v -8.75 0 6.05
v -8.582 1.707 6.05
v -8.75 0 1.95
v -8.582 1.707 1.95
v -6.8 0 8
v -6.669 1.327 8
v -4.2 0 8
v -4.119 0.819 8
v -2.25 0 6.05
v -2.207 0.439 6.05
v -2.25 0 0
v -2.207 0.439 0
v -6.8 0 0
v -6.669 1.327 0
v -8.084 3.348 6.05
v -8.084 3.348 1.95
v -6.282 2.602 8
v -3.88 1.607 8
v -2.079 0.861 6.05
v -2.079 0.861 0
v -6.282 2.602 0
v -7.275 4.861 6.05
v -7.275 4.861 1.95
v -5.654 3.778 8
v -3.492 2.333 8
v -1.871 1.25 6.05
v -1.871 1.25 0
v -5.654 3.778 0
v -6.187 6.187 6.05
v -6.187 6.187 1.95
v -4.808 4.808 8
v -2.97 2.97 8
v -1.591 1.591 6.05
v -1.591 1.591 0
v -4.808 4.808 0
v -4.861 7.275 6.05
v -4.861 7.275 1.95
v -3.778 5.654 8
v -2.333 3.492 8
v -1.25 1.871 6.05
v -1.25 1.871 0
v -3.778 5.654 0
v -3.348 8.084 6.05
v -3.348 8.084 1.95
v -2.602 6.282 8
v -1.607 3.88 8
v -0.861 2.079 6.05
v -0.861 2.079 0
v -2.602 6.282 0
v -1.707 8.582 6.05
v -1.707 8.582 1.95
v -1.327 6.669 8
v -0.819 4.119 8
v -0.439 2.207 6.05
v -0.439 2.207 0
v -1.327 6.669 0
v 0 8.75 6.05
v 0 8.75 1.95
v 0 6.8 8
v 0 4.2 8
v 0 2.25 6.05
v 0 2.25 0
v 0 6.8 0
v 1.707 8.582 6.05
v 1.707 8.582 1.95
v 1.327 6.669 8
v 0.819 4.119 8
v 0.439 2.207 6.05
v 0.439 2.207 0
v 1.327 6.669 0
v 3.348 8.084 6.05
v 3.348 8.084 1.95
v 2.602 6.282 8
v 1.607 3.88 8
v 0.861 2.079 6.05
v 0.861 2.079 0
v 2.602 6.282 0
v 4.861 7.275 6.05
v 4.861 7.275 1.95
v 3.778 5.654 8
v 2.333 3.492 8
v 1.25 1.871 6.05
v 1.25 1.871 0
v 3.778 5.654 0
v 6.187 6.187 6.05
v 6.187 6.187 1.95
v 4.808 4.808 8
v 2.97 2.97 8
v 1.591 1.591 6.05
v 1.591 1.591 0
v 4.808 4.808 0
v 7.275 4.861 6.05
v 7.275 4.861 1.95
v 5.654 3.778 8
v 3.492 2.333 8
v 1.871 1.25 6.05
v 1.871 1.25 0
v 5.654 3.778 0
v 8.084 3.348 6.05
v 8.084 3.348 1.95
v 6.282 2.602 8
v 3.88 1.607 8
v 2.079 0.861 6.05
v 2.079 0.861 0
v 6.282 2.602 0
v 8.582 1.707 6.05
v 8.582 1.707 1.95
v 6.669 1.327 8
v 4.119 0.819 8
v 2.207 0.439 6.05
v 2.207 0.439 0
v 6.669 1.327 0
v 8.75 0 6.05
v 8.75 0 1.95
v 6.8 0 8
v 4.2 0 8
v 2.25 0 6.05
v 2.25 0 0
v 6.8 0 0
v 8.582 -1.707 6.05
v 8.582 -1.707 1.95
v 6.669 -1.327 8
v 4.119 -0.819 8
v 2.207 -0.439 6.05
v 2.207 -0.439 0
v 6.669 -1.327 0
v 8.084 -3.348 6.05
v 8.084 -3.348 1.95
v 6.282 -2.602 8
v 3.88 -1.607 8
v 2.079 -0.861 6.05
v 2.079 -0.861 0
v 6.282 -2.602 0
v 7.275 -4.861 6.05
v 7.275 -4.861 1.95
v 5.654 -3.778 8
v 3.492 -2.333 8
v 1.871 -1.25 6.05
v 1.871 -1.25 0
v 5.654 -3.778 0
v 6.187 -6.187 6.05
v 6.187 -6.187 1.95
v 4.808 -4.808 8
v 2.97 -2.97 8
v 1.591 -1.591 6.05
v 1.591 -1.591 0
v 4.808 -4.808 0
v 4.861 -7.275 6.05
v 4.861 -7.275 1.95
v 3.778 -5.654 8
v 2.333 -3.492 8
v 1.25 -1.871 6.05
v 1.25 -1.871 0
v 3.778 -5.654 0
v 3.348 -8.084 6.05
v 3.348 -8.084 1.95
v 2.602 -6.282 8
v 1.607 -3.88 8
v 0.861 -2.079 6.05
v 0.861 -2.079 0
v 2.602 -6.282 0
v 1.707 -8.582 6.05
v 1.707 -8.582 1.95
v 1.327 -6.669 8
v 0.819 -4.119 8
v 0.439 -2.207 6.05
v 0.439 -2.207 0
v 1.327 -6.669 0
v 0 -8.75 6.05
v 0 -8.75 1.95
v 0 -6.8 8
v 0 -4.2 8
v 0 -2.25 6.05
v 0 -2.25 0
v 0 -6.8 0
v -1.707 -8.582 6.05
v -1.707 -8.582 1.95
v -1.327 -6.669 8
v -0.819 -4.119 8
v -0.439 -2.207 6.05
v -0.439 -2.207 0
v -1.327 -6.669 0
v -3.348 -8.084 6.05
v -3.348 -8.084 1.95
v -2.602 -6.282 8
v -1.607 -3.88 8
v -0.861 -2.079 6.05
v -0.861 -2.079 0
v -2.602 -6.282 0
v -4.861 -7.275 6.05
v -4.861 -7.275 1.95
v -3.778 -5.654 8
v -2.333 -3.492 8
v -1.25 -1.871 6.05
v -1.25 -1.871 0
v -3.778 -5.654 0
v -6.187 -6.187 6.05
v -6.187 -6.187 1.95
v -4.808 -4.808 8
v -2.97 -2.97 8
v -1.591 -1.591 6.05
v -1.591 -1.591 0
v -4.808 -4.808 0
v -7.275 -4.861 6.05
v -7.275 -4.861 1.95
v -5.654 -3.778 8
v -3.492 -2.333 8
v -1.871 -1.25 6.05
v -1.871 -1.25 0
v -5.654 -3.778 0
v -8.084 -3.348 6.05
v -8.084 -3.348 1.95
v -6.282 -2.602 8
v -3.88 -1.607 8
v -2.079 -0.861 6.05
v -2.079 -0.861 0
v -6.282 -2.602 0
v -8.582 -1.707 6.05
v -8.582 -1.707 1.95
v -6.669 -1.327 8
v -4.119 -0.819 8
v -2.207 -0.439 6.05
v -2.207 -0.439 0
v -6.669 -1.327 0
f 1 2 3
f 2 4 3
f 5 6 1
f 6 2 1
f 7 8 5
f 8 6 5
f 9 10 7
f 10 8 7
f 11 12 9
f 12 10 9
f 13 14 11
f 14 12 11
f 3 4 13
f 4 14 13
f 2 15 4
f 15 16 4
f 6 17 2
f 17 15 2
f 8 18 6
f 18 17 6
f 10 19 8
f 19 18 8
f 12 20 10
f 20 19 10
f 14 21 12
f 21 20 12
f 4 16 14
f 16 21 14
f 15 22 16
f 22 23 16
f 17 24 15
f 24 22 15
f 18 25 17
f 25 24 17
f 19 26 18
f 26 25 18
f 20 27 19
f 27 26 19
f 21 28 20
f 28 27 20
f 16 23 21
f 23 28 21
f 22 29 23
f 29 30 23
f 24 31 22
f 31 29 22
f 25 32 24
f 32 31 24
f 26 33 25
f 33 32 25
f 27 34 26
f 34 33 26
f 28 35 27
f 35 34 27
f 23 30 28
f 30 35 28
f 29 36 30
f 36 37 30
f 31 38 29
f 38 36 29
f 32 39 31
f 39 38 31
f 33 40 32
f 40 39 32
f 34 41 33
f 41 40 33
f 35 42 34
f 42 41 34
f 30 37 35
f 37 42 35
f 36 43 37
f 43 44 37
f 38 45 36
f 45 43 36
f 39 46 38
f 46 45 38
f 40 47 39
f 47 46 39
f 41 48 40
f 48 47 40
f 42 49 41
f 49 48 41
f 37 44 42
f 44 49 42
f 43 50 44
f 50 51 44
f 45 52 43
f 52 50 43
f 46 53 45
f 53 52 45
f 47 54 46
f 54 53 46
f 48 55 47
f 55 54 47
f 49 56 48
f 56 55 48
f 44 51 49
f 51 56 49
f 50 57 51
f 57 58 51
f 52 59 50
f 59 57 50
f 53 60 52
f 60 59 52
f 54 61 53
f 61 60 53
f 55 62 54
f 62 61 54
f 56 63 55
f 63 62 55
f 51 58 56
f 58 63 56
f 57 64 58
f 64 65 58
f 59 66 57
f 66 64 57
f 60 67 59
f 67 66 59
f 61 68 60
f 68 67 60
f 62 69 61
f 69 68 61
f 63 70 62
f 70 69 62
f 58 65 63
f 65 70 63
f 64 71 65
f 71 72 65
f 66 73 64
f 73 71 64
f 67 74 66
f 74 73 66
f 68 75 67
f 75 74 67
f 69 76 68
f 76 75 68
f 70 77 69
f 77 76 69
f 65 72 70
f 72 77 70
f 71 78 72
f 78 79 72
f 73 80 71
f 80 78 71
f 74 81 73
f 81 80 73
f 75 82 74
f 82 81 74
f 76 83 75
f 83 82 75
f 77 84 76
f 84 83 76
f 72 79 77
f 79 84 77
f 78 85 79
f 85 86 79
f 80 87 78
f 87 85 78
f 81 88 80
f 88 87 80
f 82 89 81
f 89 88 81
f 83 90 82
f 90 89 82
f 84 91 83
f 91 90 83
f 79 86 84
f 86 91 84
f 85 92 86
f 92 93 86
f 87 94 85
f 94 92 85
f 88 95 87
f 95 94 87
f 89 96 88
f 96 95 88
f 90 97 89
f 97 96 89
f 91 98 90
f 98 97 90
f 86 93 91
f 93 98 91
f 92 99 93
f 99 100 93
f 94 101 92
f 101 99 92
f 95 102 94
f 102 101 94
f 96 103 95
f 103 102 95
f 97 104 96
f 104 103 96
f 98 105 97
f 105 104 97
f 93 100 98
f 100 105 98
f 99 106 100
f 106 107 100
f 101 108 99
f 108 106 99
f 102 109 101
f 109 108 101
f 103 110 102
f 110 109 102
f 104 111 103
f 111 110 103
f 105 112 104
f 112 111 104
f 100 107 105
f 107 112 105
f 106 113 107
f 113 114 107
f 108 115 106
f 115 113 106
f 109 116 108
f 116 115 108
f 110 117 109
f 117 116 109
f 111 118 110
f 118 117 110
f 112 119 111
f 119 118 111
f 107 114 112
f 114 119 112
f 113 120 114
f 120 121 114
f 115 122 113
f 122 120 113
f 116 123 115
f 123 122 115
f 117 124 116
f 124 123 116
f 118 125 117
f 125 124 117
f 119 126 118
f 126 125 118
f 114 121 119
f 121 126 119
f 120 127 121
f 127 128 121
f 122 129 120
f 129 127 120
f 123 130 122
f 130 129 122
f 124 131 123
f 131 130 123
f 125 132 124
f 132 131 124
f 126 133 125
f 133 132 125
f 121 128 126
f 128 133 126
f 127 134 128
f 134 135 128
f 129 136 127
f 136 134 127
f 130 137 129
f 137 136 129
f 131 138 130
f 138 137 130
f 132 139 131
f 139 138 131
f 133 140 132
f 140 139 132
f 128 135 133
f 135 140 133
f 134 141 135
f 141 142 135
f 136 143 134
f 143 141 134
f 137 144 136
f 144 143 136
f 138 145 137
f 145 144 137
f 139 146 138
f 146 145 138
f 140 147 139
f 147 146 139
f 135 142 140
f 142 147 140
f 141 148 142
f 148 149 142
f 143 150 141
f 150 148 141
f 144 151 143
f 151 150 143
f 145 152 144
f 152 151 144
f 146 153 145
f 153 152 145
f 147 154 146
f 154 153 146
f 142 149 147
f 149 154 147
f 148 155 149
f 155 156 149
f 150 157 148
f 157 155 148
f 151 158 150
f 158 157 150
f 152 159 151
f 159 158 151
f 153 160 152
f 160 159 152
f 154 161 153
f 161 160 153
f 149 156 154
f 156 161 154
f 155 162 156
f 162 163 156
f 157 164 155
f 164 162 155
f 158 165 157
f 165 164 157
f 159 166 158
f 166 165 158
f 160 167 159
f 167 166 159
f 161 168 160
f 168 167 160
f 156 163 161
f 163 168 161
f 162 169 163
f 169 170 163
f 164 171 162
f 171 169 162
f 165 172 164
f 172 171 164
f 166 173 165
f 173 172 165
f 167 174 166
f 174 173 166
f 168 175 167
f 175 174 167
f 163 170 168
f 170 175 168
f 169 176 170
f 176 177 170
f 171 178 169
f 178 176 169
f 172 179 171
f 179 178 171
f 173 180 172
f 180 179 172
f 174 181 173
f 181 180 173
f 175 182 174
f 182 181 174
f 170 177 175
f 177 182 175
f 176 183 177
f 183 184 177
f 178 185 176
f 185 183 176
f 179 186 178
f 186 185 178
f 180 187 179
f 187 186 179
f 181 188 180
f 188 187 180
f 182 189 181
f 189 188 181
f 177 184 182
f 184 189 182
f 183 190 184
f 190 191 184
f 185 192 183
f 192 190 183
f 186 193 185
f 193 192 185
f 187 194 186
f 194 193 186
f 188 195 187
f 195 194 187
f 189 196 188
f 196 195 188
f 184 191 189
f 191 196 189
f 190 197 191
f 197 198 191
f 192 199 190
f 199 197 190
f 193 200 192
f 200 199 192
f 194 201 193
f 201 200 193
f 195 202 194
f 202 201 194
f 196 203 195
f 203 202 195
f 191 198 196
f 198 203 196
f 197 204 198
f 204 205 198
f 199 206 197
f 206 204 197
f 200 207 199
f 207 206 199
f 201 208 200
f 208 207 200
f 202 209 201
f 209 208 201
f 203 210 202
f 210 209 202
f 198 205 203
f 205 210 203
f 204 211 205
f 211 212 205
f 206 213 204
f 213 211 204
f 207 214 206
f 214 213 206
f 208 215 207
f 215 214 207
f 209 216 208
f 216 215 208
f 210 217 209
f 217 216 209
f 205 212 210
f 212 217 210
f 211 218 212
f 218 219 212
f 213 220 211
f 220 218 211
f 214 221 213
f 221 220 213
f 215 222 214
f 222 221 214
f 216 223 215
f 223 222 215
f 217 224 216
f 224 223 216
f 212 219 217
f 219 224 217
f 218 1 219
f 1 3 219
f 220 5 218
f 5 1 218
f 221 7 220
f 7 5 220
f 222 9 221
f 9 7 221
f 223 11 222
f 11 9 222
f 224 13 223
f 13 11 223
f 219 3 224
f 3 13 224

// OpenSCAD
$fn = 32;

// ----------------------------------------------------------------------
// Form washer: chamfered washer, 17.5 mm outside, 4.5 mm bore
// ----------------------------------------------------------------------

// --- parameters (mm) ---
revolve_angle = 360;      // full turn around the Z axis
profile_points = 7;       // points of the closed outline

profile = [[2.25, 0], [6.8, 0], [8.75, 1.95], [8.75, 6.05], [6.8, 8], [4.2, 8], [2.25, 6.05]];  // single closed polygon, 7 points, counter clockwise

// --- the one profile operation ---
rotate_extrude(angle = revolve_angle) polygon(points = profile);
